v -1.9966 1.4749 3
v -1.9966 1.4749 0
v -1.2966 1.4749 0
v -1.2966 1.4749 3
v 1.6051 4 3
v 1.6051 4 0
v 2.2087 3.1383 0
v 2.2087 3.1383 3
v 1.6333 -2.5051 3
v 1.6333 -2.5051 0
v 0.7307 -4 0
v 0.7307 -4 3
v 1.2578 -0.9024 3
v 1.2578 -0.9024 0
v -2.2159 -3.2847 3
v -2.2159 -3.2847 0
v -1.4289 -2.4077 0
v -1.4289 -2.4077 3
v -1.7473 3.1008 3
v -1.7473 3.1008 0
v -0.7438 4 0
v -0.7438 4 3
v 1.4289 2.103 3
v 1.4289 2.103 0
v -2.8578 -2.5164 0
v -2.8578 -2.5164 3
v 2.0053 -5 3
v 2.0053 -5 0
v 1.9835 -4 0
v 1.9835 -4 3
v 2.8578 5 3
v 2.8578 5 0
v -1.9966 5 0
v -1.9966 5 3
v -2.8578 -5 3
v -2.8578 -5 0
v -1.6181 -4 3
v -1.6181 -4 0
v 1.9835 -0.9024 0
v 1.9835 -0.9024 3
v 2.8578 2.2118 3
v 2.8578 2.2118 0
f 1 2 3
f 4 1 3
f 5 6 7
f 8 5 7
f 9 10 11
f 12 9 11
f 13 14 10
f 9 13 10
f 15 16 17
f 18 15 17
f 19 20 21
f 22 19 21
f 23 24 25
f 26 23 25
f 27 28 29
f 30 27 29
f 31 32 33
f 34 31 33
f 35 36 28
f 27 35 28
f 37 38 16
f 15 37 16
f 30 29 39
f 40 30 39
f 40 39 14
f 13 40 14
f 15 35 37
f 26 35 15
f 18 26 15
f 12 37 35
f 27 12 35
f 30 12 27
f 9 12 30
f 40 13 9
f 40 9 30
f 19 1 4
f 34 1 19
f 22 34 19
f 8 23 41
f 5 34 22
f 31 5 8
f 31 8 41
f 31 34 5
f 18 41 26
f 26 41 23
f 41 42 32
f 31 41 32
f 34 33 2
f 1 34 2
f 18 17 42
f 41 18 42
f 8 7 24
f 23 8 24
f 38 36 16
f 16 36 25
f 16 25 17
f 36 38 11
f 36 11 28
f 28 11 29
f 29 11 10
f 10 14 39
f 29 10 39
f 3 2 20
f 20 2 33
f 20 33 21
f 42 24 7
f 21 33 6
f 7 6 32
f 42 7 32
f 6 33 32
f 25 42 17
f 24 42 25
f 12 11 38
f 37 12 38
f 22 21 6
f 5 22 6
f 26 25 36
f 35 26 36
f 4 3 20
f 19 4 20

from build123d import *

# Parameters (mm, degrees)
F1_DEPTH = 3


with BuildPart() as f1:
    # F0 (on Top) → F1 (new body)
    with BuildSketch(Plane.XY):
        Polygon((-1.428907, -2.407704), (2.857814, 2.211777), (2.208733, 3.138307), (1.428907, 2.103039), (-2.857814, -2.516442), (-2.215881, -3.284665), align=None)
        Polygon((-2.857814, -4), (-2.215881, -3.284665), (-2.857814, -2.516442), align=None)
        Polygon((0.730746, -4), (-1.618143, -4), (-2.857814, -4), (-2.857814, -5), (2.005268, -5), (1.983487, -4), align=None)
        Polygon((1.633301, -2.505144), (1.983487, -4), (1.983487, -1.925149), align=None)
        Polygon((1.633301, -2.505144), (0.730746, -4), (1.983487, -4), align=None)
        Polygon((1.605074, 4), (2.857814, 4), (2.857814, 5), (-1.996555, 5), (-1.996555, 4), (-0.743815, 4), align=None)
        Polygon((-1.747311, 3.100817), (-1.996555, 4), (-1.996555, 2.877482), align=None)
        Polygon((-1.296617, 1.474879), (-1.747311, 3.100817), (-1.996555, 2.877482), (-1.996555, 1.474879), align=None)
        Polygon((-1.747311, 3.100817), (-0.743815, 4), (-1.996555, 4), align=None)
        Polygon((1.257835, -0.902368), (1.633301, -2.505144), (1.983487, -1.925149), (1.983487, -0.902368), align=None)
        Polygon((2.208733, 3.138307), (2.857814, 2.211777), (2.857814, 4), align=None)
        Polygon((-1.618143, -4), (-2.215881, -3.284665), (-2.857814, -4), align=None)
        Polygon((2.208733, 3.138307), (2.857814, 4), (1.605074, 4), align=None)
    extrude(amount=F1_DEPTH)


solid = f1.part
